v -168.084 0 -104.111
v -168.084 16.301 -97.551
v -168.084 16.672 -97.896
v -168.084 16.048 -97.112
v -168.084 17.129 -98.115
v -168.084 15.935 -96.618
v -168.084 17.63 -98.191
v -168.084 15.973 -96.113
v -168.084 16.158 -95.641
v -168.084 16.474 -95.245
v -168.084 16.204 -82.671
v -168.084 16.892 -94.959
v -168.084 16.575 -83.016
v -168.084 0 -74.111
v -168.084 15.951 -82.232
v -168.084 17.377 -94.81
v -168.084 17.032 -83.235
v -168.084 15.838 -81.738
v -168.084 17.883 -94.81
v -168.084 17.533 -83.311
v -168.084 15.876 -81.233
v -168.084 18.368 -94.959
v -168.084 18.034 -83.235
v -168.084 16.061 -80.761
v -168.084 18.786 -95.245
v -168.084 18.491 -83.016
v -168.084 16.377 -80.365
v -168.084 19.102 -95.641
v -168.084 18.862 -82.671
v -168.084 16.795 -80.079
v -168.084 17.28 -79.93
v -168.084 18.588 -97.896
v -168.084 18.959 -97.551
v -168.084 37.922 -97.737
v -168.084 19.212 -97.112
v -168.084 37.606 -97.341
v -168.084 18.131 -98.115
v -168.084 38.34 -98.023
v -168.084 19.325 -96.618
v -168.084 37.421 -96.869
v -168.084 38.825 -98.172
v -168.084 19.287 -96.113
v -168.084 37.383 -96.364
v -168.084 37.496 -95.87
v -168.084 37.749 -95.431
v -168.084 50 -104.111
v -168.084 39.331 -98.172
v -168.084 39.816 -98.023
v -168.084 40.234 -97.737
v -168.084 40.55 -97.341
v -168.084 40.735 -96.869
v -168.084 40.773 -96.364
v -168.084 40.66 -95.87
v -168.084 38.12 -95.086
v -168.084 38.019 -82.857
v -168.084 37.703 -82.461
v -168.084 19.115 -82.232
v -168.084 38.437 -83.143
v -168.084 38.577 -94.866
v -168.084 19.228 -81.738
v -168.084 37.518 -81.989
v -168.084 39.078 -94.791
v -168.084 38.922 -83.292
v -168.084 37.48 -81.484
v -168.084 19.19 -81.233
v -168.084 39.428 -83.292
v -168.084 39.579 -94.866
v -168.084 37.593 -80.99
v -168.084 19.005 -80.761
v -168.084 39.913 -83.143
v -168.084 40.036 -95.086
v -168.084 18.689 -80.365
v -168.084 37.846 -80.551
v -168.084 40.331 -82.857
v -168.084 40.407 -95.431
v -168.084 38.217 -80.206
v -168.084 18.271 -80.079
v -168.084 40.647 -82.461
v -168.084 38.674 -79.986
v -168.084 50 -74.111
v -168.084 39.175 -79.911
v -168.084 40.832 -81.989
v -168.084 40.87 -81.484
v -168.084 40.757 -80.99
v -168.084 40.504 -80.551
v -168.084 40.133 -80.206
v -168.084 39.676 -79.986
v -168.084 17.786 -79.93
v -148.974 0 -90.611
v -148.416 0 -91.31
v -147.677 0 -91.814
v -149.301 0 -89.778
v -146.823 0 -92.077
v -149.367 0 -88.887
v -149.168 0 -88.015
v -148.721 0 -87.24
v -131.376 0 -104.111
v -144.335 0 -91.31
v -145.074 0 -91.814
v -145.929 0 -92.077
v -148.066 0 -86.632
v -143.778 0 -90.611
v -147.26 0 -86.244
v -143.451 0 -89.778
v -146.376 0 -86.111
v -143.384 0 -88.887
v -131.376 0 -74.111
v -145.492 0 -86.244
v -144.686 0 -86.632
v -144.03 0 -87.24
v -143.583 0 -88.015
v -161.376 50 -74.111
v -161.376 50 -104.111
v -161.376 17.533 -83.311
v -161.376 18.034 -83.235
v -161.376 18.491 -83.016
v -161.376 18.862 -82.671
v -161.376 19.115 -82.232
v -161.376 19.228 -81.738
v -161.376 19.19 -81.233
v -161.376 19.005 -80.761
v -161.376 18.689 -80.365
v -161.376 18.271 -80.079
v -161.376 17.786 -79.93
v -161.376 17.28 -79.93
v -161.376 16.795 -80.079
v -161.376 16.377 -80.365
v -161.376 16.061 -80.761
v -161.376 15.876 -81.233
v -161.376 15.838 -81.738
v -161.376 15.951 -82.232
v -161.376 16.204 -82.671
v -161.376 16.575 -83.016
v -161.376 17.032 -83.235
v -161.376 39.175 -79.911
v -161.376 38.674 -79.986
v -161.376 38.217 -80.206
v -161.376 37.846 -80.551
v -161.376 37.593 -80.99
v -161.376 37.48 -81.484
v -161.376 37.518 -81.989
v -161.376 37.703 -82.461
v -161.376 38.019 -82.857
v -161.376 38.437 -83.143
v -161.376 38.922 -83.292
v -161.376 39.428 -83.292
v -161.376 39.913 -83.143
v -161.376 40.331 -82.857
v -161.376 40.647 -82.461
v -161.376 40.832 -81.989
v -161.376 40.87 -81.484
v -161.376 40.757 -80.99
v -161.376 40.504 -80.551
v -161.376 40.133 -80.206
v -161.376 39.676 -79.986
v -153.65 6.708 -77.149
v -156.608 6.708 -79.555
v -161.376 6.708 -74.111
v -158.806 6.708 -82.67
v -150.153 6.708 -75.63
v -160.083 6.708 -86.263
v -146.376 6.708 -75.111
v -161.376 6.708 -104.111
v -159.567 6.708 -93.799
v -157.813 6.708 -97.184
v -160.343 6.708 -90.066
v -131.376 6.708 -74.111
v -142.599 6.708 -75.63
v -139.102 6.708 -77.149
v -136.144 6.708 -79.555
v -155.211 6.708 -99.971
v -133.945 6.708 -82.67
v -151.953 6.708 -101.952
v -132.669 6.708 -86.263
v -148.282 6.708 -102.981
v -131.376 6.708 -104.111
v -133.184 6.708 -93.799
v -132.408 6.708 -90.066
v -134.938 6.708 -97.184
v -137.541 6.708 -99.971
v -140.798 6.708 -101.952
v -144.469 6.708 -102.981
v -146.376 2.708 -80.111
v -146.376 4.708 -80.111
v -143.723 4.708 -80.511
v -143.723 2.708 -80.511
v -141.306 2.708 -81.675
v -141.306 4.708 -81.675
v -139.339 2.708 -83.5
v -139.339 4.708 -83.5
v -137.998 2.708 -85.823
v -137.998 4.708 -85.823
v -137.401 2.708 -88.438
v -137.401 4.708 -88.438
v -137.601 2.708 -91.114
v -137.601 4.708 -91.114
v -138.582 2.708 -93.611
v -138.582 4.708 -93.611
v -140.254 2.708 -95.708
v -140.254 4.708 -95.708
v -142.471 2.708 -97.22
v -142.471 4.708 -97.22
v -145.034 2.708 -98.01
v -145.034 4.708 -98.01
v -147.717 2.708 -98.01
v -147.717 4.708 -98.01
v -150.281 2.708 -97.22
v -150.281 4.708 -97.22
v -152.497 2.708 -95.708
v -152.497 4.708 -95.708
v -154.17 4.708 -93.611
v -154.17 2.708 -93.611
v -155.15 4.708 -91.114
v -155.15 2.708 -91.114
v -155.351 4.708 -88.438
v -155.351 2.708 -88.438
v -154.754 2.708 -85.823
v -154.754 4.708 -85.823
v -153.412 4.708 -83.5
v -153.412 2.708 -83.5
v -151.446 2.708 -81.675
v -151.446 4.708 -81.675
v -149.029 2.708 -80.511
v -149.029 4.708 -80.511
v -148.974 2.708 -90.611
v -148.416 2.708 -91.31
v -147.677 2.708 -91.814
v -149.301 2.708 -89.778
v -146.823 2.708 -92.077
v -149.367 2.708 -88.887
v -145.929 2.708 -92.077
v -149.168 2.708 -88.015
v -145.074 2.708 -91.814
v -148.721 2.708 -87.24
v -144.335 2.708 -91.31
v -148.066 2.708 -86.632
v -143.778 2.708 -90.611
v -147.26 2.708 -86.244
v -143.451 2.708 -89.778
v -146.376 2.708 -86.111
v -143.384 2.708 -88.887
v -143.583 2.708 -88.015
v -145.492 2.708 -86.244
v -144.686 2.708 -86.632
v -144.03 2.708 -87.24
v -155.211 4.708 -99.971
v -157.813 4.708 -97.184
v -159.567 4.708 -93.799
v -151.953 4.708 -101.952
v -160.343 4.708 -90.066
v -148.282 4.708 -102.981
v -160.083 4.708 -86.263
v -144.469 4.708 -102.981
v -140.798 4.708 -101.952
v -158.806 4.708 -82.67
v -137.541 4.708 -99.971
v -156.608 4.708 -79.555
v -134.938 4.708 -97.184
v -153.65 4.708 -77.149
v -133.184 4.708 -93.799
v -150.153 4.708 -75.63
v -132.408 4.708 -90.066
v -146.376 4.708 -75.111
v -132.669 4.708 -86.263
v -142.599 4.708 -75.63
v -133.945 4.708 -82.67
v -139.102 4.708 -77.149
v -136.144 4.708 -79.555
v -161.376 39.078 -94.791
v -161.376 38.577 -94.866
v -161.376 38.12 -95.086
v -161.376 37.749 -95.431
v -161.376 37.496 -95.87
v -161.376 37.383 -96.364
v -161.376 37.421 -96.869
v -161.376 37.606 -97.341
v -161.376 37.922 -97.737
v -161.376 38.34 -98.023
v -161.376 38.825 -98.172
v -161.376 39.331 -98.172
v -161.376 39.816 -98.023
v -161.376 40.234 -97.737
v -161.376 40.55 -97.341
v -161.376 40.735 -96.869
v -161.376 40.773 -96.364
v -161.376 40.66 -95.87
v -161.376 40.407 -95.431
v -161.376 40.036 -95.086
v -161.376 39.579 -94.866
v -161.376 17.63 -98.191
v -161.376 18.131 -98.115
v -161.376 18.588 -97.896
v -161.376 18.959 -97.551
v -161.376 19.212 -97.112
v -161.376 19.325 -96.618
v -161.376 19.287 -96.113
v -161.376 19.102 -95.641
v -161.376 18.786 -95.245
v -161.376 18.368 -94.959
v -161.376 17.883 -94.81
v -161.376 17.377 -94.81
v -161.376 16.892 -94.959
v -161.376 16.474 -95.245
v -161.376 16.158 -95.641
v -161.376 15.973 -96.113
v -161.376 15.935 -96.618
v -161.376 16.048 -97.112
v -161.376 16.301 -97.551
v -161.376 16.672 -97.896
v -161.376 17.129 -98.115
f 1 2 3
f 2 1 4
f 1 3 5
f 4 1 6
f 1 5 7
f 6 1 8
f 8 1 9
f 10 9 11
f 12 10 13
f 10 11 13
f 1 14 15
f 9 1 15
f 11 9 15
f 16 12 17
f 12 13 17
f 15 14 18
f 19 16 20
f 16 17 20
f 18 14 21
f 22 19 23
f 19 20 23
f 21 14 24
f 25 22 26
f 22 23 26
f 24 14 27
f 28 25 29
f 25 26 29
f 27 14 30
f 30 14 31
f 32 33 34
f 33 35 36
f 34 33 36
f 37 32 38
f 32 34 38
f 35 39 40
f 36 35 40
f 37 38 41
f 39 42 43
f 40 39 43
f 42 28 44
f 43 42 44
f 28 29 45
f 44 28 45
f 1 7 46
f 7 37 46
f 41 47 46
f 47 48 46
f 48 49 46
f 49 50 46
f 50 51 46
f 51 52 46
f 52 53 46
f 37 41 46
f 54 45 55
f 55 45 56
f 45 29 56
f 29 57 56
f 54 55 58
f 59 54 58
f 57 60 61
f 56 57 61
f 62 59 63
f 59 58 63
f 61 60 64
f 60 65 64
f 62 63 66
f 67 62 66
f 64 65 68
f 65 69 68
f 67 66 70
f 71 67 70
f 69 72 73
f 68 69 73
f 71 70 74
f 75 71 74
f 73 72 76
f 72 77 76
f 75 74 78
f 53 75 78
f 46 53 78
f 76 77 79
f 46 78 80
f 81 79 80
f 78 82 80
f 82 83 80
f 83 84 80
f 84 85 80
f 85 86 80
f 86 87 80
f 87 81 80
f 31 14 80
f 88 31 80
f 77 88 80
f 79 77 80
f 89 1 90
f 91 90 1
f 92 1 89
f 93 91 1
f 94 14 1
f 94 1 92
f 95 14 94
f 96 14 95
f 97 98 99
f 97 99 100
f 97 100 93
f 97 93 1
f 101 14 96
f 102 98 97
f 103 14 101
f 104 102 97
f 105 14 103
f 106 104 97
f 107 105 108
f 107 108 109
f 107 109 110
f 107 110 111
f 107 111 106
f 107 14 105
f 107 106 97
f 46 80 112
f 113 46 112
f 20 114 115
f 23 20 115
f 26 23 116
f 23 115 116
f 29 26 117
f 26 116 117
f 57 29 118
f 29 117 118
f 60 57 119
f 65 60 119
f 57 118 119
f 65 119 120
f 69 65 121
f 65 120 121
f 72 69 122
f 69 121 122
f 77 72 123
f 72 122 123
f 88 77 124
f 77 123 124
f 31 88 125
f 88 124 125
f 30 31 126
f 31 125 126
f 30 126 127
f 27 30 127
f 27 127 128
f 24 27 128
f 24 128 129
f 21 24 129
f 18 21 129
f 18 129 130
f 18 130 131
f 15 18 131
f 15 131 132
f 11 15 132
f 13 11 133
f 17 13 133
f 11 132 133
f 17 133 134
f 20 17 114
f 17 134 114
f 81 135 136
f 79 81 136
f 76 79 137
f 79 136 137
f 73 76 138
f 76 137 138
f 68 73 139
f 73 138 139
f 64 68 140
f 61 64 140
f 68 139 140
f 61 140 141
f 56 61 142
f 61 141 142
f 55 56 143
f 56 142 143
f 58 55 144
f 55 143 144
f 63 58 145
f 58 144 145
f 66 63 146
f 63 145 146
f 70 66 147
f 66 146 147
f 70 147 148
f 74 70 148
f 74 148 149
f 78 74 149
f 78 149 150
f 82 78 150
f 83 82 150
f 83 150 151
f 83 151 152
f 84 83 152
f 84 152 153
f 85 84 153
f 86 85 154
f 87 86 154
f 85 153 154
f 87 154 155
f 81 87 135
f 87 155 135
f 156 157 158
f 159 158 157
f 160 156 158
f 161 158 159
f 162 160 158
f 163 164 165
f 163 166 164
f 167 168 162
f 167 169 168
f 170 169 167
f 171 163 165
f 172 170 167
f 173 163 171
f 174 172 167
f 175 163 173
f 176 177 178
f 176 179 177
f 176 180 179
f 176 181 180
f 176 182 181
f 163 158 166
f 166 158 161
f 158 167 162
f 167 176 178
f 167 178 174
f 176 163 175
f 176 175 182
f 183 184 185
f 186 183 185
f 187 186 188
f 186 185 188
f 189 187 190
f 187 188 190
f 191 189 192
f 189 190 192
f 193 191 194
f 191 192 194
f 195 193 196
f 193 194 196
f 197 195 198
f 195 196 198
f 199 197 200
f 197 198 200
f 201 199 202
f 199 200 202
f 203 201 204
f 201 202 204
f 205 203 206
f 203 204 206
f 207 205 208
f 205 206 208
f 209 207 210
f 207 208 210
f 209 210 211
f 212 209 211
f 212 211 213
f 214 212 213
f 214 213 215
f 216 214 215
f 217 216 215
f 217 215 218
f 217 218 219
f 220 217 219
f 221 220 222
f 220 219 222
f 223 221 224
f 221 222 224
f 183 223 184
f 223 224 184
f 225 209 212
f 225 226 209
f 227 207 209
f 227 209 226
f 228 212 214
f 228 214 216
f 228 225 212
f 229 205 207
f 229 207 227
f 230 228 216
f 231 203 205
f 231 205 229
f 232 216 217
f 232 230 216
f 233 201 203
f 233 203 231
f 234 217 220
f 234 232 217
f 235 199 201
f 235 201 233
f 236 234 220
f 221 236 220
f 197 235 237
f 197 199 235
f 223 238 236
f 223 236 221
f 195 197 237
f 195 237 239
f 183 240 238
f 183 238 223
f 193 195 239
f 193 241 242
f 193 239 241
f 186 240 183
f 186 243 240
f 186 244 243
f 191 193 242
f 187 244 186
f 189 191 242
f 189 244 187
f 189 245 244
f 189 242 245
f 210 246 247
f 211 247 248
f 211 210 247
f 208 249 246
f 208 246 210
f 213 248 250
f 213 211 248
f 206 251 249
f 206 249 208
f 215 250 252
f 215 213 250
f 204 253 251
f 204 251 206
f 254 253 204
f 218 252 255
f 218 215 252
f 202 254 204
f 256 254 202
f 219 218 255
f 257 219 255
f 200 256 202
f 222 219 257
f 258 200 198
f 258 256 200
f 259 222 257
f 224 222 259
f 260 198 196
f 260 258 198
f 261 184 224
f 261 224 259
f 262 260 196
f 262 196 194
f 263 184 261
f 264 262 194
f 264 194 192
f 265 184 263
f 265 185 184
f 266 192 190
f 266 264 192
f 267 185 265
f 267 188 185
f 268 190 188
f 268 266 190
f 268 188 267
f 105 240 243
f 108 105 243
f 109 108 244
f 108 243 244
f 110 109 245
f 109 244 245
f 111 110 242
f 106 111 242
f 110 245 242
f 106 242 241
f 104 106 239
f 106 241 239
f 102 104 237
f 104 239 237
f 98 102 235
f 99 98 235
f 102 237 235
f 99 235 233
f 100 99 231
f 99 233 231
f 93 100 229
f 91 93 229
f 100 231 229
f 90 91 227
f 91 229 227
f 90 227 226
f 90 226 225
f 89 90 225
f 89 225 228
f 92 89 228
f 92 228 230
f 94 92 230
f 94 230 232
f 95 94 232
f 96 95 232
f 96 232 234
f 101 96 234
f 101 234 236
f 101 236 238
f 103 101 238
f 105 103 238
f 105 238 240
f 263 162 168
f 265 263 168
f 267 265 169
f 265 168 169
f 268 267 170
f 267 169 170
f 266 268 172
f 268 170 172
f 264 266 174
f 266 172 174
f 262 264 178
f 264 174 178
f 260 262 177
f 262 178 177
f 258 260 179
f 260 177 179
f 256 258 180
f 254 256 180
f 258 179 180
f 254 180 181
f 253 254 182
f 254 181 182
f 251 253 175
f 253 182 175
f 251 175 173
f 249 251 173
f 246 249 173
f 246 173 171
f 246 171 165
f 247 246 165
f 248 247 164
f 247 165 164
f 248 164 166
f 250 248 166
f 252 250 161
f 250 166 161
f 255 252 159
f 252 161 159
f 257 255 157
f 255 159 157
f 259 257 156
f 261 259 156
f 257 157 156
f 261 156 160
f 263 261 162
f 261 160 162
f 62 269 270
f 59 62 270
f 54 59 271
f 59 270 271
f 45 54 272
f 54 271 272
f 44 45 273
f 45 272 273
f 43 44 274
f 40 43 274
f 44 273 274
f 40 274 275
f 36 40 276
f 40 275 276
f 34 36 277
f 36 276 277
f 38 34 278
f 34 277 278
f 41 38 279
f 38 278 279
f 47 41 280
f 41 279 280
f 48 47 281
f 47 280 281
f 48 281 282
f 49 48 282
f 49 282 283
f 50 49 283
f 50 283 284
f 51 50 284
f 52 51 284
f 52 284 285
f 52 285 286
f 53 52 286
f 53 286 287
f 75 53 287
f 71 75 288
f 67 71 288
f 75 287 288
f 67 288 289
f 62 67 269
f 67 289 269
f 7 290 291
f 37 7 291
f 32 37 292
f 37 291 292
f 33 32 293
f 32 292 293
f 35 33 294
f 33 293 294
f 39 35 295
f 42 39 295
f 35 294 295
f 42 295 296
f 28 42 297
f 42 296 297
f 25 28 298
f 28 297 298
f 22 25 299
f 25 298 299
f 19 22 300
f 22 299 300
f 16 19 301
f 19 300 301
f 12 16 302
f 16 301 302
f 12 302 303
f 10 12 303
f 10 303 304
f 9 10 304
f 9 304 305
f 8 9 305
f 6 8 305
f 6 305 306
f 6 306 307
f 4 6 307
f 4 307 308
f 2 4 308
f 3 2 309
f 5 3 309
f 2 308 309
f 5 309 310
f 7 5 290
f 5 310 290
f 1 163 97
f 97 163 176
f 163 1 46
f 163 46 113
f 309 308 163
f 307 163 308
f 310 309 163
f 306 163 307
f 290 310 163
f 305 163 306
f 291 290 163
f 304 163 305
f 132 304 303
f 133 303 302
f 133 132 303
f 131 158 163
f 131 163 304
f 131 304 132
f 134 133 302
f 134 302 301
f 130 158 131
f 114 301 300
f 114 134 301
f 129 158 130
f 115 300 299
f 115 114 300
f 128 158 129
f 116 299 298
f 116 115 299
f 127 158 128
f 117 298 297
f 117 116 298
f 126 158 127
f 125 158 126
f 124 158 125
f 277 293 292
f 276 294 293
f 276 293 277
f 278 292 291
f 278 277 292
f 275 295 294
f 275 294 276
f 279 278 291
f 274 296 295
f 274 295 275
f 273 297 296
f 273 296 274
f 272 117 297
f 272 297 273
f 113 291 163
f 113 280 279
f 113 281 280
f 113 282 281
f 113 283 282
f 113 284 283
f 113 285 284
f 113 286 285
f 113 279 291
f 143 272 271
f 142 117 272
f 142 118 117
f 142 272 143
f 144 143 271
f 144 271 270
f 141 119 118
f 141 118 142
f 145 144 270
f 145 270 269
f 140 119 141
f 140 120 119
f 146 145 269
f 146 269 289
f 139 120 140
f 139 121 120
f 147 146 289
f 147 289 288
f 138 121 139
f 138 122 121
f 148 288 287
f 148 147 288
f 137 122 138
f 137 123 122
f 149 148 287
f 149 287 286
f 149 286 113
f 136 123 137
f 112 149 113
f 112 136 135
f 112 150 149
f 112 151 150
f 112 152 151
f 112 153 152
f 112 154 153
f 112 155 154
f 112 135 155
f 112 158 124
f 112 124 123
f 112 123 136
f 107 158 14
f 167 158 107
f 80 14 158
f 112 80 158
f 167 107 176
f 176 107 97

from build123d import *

# Parameters (mm, degrees)
SKETCH2_W           = 30
SKETCH2_H           = 30
BOSS_EXTRUDE1_DEPTH = 6.708
SKETCH5_R           = 14
CUT_EXTRUDE1_DEPTH  = 2
SKETCH13_R          = 9
CUT_EXTRUDE3_DEPTH  = 2
SKETCH15_R          = 3
CUT_EXTRUDE5_DEPTH  = 8.35
SKETCH16_W          = 6.708000046
SKETCH16_H          = 50
BOSS_EXTRUDE3_DEPTH = 30
SKETCH17_R          = 1.7
CUT_EXTRUDE7_DEPTH  = 6.708


with BuildPart() as part:
    # Sketch2 → Boss-Extrude1 (new body)
    with BuildSketch(Plane(origin=(0, 0, 0), x_dir=(1, 0, 0), z_dir=(0, 1, 0))):
        with Locations((-146.375821197, 89.110918047)):
            Rectangle(SKETCH2_W, SKETCH2_H)
    extrude(amount=BOSS_EXTRUDE1_DEPTH)

    # Sketch5 → Cut-Extrude1 (cut)
    with BuildSketch(Plane(origin=(0, 6.708, 0), x_dir=(1, 0, 0), z_dir=(0, 1, 0))):
        with Locations(Location((-146.375821197, 89.110918047, 0), (0, 0, 270))):
            Circle(SKETCH5_R)
    extrude(amount=-CUT_EXTRUDE1_DEPTH, mode=Mode.SUBTRACT)

    # Sketch13 → Cut-Extrude3 (cut)
    with BuildSketch(Plane(origin=(0, 4.708, 0), x_dir=(1, 0, 0), z_dir=(0, 1, 0))):
        with Locations(Location((-146.375821197, 89.110918047, 0), (0, 0, 270))):
            Circle(SKETCH13_R)
    extrude(amount=-CUT_EXTRUDE3_DEPTH, mode=Mode.SUBTRACT)

    # Sketch15 → Cut-Extrude5 (cut)
    with BuildSketch(Plane(origin=(0, 2.708, 0), x_dir=(1, 0, 0), z_dir=(0, 1, 0))):
        with Locations(Location((-146.375821197, 89.110918047, 0), (0, 0, 270))):
            Circle(SKETCH15_R)
    extrude(amount=-CUT_EXTRUDE5_DEPTH, mode=Mode.SUBTRACT)

    # Sketch16 → Boss-Extrude3 (add)
    with BuildSketch(Plane.XY.offset(-74.110918047)):
        with Locations((-164.72982122, 25)):
            Rectangle(SKETCH16_W, SKETCH16_H)
    extrude(amount=-BOSS_EXTRUDE3_DEPTH)

    # Sketch17 → Cut-Extrude7 (cut)
    with BuildSketch(Plane(origin=(-161.375821197, 0, 0), x_dir=(0, 0, -1), z_dir=(1, 0, 0))):
        with Locations((81.610918047, 17.533)):
            Circle(SKETCH17_R)
        with Locations((96.490918047, 17.63)):
            Circle(SKETCH17_R)
        with Locations(Location((96.490918047, 39.078, 0), (0, 0, 180))):
            Circle(SKETCH17_R)
        with Locations(Location((81.610918047, 39.175, 0), (0, 0, 180))):
            Circle(SKETCH17_R)
    extrude(amount=-CUT_EXTRUDE7_DEPTH, mode=Mode.SUBTRACT)


solid = part.part
